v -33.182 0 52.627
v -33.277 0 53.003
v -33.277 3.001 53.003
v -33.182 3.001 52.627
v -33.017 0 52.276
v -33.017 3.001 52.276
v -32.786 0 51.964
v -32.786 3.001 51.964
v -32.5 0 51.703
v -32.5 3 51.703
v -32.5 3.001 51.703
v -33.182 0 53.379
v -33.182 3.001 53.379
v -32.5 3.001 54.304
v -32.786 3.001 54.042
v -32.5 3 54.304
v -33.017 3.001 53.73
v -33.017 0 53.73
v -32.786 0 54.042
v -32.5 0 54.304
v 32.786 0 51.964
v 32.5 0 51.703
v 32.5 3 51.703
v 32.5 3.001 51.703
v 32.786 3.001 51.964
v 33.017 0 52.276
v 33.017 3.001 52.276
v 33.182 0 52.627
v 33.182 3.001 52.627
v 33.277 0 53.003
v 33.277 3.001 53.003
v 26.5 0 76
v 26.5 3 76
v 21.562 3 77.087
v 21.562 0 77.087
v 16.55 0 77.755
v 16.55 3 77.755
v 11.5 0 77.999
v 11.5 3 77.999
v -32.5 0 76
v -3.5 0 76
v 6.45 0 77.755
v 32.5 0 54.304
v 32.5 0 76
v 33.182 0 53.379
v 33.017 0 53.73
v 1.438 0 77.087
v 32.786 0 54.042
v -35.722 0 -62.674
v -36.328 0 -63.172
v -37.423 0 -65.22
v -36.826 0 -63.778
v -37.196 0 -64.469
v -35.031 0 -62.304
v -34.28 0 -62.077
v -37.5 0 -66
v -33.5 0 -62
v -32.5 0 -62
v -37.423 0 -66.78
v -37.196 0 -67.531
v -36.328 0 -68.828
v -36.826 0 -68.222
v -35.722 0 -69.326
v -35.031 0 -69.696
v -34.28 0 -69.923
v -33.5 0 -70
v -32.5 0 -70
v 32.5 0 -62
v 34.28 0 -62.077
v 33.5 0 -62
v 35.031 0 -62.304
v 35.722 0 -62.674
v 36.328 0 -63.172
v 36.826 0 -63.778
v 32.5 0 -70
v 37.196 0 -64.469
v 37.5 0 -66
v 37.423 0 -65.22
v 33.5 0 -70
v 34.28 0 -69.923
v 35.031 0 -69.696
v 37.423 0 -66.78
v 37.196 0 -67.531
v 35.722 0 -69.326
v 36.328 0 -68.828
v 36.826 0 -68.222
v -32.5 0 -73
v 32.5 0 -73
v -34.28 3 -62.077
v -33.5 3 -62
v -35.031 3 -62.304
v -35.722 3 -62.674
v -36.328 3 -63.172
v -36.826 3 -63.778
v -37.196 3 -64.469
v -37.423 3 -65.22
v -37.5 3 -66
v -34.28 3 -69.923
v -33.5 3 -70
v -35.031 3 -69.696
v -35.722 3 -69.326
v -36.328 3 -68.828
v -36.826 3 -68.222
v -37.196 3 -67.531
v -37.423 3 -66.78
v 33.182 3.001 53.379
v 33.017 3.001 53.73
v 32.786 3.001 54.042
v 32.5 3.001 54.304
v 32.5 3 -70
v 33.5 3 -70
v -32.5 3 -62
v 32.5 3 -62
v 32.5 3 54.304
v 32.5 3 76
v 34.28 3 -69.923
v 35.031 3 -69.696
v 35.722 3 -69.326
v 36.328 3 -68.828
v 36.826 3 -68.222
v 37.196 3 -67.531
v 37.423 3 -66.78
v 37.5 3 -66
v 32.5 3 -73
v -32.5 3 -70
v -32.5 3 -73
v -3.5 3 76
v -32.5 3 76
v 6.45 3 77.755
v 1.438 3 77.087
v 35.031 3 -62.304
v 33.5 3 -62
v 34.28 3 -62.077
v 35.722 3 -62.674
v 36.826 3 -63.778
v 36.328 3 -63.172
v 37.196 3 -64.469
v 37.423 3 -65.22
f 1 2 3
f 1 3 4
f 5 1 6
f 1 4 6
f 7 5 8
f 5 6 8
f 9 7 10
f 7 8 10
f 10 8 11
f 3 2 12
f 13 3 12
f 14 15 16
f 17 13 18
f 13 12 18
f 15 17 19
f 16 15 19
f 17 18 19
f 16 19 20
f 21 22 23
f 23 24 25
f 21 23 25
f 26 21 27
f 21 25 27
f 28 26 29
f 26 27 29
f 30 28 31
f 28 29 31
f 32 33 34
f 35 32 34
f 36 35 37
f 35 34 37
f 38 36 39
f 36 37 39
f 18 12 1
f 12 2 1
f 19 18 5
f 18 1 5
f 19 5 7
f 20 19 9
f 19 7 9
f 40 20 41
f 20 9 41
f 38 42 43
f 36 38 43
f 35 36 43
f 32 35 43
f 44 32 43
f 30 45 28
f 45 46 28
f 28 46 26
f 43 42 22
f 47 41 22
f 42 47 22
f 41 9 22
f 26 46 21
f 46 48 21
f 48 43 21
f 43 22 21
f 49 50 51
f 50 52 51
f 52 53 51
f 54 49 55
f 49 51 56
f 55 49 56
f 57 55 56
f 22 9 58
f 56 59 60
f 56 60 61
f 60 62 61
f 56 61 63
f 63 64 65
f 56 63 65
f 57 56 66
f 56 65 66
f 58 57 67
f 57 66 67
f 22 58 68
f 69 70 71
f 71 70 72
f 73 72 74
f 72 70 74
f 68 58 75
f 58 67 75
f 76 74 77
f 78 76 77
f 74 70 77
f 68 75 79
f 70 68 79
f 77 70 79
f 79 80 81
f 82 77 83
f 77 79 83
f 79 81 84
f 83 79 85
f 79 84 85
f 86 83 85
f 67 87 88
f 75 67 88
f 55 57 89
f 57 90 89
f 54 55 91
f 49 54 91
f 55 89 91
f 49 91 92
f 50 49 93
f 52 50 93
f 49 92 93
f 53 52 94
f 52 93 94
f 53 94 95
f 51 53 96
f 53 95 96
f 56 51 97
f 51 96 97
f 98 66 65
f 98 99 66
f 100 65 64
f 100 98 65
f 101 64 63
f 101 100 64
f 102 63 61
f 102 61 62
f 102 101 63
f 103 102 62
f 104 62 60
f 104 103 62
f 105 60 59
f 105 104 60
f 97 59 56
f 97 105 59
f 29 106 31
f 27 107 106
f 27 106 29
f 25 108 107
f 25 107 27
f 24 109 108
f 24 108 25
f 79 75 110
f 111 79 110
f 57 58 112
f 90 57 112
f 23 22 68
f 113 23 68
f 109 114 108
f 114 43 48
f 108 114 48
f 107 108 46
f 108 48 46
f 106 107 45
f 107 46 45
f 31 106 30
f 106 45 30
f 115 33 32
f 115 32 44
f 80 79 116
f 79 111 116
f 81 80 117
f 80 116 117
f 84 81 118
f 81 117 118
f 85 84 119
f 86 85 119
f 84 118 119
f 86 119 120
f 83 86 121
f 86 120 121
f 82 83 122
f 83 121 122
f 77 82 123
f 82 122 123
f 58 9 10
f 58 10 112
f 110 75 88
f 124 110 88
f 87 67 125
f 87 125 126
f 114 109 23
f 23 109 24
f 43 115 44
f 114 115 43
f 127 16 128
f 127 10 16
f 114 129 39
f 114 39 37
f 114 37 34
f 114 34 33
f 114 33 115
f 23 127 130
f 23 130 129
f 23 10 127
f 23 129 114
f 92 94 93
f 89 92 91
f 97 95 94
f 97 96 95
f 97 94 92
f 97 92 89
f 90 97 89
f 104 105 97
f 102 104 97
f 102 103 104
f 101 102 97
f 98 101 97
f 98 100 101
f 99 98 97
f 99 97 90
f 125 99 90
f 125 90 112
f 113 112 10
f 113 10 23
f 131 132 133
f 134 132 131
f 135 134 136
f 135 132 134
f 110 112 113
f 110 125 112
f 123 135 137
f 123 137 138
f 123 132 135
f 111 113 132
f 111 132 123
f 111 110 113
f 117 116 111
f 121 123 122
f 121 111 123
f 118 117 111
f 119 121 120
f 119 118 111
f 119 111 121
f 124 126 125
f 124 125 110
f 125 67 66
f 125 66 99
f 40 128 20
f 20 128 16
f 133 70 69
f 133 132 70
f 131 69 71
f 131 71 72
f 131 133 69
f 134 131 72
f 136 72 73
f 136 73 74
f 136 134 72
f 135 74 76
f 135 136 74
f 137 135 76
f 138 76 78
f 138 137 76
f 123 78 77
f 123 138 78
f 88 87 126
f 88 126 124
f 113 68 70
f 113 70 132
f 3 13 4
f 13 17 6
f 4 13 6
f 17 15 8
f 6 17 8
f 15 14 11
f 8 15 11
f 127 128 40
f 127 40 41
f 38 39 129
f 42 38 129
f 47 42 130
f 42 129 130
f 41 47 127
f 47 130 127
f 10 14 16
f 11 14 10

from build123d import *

# Parameters (mm, degrees)
CROQUIS1_W               = 65
CROQUIS1_H               = 146
SALIENTE_EXTRUIR1_DEPTH  = 3
CROQUIS2_W               = 8
CROQUIS2_H               = 3
SALIENTE_EXTRUIR2_DEPTH  = 5
REDONDEO1_R              = 4
REDONDEO1_OF_SIMETR_A1_R = 4
CROQUIS3_W               = 2.60095456
CROQUIS3_H               = 3.001101416
SALIENTE_EXTRUIR3_DEPTH  = 0.8
REDONDEO2_R              = 2
REDONDEO2_OF_SIMETR_A5_R = 2
CROQUIS4_W               = 65
CROQUIS4_H               = 3
CROQUIS4_W_2             = 30
CROQUIS4_H_2             = 2
SALIENTE_EXTRUIR4_DEPTH  = 3
REDONDEO3_R              = 60


# Some blends are built 0.0001 mm under size
with BuildPart() as part:
    # Croquis1 → Saliente-Extruir1 (new body)
    with BuildSketch(Plane(origin=(0, 0, 0), x_dir=(1, 0, 0), z_dir=(0, 1, 0))):
        Rectangle(CROQUIS1_W, CROQUIS1_H)
    extrude(amount=SALIENTE_EXTRUIR1_DEPTH)

    # Croquis2 → Saliente-Extruir2 (add)
    with BuildSketch(Plane(origin=(32.5, 0, 0), x_dir=(0, 0, -1), z_dir=(1, 0, 0))):
        with Locations((66, 1.5)):
            Rectangle(CROQUIS2_W, CROQUIS2_H)
    saliente_extruir2 = extrude(amount=SALIENTE_EXTRUIR2_DEPTH)

    # Redondeo1
    redondeo1_edges = [part.edges().sort_by_distance(p)[0] for p in [
        (37.5, 1.5, -62),
        (37.5, 1.5, -70),
    ]]
    fillet(redondeo1_edges, radius=REDONDEO1_R - 0.0001)  # a hair under: the kernel refuses the full size

    # Simetría1: Saliente-Extruir2 across plane
    add(saliente_extruir2.mirror(Plane(origin=(0, 0, 0), x_dir=(0, 0, 1), z_dir=(1, 0, 0))))

    # Redondeo1 of Simetría1
    redondeo1_of_simetr_a1_edges = [part.edges().sort_by_distance(p)[0] for p in [
        (-37.5, 1.5, -62),
        (-37.5, 1.5, -70),
    ]]
    fillet(redondeo1_of_simetr_a1_edges, radius=REDONDEO1_OF_SIMETR_A1_R - 0.0001)  # a hair under: the kernel refuses the full size

    # Croquis3 → Saliente-Extruir3 (add)
    with BuildSketch(Plane(origin=(32.5, 0, 0), x_dir=(0, 0, -1), z_dir=(1, 0, 0))):
        with Locations((-53.003039433, 1.500550708)):
            Rectangle(CROQUIS3_W, CROQUIS3_H)
    saliente_extruir3 = extrude(amount=SALIENTE_EXTRUIR3_DEPTH)

    # Redondeo2
    # the kernel refuses this fillet: 2 mm, written as the material it takes off along each edge
    with BuildSketch(Plane(origin=(33.3, 7.001101416, 51.702562153), x_dir=(-1, 0, 0), z_dir=(0, -1, 0)), Plane(origin=(33.3, -4, 54.303516713), x_dir=(-1, 0, 0), z_dir=(0, 1, 0))) as redondeo2_piece_1:
        with BuildLine():
            CenterArc((2, -1.6), REDONDEO2_R, 126.869897646, 53.130102354)
            Line((0, -1.6), (-0.04, -1.6))
            Line((-0.04, -1.6), (-0.04, 0))
            Line((-0.04, 0), (0, 0.04))
            ThreePointArc((0, 0.04), (0.4, 0.04), (0.776, 0.032))
            Line((0.776, 0.032), (0.8, 0))
        make_face()
    extrude(amount=11.001101416, mode=Mode.SUBTRACT)

    # Simetría5: Saliente-Extruir3 across plane
    add(saliente_extruir3.mirror(Plane(origin=(0, 0, 0), x_dir=(0, 0, 1), z_dir=(1, 0, 0))))

    # Redondeo2 of Simetría5
    # the kernel refuses this fillet: 2 mm, written as the material it takes off along each edge
    with BuildSketch(Plane(origin=(-33.3, 7.001101416, 51.702562153), x_dir=(1, 0, 0), z_dir=(0, -1, 0)), Plane(origin=(-33.3, -4, 54.303516713), x_dir=(1, 0, 0), z_dir=(0, 1, 0))) as redondeo2_of_simetr_a5_piece_1:
        with BuildLine():
            CenterArc((2, 1.6), REDONDEO2_OF_SIMETR_A5_R, 180, 53.130102354)
            Line((0, 1.6), (-0.04, 1.6))
            Line((-0.04, 1.6), (-0.04, 0))
            Line((-0.04, 0), (0, -0.04))
            ThreePointArc((0, -0.04), (0.4, -0.04), (0.776, -0.032))
            Line((0.776, -0.032), (0.8, 0))
        make_face()
    extrude(amount=11.001101416, mode=Mode.SUBTRACT)

    # Croquis4 → Saliente-Extruir4 (add)
    with BuildSketch(Plane(origin=(0, 3, 0), x_dir=(1, 0, 0), z_dir=(0, 1, 0))):
        with Locations((0, -74.5)):
            Rectangle(CROQUIS4_W, CROQUIS4_H)
        with Locations((11.5, -77)):
            Rectangle(CROQUIS4_W_2, CROQUIS4_H_2)
    extrude(amount=-SALIENTE_EXTRUIR4_DEPTH)

    # Redondeo3
    # the kernel refuses this fillet: 60 mm, written as the material it takes off along each edge
    with BuildSketch(Plane(origin=(26.5, 41.405728739, 78), x_dir=(0, 0, -1), z_dir=(0, -1, 0))) as redondeo3_piece_1:
        with BuildLine():
            CenterArc((60, -15.362291496), REDONDEO3_R, 165.164888418, 14.835111582)
            Line((0, -15.362291496), (0, 0))
            Line((0, 0), (2, 0))
        make_face()
    extrude(amount=79.811457479, mode=Mode.SUBTRACT)
    with BuildSketch(Plane(origin=(-3.5, 41.405728739, 78), x_dir=(1, 0, 0), z_dir=(0, -1, 0))) as redondeo3_piece_2:
        with BuildLine():
            CenterArc((15.362291496, -60), REDONDEO3_R, 90, 14.835111582)
            Line((0, -2), (0, 0))
            Line((0, 0), (15.362291496, 0))
        make_face()
    extrude(amount=79.811457479, mode=Mode.SUBTRACT)


solid = part.part
